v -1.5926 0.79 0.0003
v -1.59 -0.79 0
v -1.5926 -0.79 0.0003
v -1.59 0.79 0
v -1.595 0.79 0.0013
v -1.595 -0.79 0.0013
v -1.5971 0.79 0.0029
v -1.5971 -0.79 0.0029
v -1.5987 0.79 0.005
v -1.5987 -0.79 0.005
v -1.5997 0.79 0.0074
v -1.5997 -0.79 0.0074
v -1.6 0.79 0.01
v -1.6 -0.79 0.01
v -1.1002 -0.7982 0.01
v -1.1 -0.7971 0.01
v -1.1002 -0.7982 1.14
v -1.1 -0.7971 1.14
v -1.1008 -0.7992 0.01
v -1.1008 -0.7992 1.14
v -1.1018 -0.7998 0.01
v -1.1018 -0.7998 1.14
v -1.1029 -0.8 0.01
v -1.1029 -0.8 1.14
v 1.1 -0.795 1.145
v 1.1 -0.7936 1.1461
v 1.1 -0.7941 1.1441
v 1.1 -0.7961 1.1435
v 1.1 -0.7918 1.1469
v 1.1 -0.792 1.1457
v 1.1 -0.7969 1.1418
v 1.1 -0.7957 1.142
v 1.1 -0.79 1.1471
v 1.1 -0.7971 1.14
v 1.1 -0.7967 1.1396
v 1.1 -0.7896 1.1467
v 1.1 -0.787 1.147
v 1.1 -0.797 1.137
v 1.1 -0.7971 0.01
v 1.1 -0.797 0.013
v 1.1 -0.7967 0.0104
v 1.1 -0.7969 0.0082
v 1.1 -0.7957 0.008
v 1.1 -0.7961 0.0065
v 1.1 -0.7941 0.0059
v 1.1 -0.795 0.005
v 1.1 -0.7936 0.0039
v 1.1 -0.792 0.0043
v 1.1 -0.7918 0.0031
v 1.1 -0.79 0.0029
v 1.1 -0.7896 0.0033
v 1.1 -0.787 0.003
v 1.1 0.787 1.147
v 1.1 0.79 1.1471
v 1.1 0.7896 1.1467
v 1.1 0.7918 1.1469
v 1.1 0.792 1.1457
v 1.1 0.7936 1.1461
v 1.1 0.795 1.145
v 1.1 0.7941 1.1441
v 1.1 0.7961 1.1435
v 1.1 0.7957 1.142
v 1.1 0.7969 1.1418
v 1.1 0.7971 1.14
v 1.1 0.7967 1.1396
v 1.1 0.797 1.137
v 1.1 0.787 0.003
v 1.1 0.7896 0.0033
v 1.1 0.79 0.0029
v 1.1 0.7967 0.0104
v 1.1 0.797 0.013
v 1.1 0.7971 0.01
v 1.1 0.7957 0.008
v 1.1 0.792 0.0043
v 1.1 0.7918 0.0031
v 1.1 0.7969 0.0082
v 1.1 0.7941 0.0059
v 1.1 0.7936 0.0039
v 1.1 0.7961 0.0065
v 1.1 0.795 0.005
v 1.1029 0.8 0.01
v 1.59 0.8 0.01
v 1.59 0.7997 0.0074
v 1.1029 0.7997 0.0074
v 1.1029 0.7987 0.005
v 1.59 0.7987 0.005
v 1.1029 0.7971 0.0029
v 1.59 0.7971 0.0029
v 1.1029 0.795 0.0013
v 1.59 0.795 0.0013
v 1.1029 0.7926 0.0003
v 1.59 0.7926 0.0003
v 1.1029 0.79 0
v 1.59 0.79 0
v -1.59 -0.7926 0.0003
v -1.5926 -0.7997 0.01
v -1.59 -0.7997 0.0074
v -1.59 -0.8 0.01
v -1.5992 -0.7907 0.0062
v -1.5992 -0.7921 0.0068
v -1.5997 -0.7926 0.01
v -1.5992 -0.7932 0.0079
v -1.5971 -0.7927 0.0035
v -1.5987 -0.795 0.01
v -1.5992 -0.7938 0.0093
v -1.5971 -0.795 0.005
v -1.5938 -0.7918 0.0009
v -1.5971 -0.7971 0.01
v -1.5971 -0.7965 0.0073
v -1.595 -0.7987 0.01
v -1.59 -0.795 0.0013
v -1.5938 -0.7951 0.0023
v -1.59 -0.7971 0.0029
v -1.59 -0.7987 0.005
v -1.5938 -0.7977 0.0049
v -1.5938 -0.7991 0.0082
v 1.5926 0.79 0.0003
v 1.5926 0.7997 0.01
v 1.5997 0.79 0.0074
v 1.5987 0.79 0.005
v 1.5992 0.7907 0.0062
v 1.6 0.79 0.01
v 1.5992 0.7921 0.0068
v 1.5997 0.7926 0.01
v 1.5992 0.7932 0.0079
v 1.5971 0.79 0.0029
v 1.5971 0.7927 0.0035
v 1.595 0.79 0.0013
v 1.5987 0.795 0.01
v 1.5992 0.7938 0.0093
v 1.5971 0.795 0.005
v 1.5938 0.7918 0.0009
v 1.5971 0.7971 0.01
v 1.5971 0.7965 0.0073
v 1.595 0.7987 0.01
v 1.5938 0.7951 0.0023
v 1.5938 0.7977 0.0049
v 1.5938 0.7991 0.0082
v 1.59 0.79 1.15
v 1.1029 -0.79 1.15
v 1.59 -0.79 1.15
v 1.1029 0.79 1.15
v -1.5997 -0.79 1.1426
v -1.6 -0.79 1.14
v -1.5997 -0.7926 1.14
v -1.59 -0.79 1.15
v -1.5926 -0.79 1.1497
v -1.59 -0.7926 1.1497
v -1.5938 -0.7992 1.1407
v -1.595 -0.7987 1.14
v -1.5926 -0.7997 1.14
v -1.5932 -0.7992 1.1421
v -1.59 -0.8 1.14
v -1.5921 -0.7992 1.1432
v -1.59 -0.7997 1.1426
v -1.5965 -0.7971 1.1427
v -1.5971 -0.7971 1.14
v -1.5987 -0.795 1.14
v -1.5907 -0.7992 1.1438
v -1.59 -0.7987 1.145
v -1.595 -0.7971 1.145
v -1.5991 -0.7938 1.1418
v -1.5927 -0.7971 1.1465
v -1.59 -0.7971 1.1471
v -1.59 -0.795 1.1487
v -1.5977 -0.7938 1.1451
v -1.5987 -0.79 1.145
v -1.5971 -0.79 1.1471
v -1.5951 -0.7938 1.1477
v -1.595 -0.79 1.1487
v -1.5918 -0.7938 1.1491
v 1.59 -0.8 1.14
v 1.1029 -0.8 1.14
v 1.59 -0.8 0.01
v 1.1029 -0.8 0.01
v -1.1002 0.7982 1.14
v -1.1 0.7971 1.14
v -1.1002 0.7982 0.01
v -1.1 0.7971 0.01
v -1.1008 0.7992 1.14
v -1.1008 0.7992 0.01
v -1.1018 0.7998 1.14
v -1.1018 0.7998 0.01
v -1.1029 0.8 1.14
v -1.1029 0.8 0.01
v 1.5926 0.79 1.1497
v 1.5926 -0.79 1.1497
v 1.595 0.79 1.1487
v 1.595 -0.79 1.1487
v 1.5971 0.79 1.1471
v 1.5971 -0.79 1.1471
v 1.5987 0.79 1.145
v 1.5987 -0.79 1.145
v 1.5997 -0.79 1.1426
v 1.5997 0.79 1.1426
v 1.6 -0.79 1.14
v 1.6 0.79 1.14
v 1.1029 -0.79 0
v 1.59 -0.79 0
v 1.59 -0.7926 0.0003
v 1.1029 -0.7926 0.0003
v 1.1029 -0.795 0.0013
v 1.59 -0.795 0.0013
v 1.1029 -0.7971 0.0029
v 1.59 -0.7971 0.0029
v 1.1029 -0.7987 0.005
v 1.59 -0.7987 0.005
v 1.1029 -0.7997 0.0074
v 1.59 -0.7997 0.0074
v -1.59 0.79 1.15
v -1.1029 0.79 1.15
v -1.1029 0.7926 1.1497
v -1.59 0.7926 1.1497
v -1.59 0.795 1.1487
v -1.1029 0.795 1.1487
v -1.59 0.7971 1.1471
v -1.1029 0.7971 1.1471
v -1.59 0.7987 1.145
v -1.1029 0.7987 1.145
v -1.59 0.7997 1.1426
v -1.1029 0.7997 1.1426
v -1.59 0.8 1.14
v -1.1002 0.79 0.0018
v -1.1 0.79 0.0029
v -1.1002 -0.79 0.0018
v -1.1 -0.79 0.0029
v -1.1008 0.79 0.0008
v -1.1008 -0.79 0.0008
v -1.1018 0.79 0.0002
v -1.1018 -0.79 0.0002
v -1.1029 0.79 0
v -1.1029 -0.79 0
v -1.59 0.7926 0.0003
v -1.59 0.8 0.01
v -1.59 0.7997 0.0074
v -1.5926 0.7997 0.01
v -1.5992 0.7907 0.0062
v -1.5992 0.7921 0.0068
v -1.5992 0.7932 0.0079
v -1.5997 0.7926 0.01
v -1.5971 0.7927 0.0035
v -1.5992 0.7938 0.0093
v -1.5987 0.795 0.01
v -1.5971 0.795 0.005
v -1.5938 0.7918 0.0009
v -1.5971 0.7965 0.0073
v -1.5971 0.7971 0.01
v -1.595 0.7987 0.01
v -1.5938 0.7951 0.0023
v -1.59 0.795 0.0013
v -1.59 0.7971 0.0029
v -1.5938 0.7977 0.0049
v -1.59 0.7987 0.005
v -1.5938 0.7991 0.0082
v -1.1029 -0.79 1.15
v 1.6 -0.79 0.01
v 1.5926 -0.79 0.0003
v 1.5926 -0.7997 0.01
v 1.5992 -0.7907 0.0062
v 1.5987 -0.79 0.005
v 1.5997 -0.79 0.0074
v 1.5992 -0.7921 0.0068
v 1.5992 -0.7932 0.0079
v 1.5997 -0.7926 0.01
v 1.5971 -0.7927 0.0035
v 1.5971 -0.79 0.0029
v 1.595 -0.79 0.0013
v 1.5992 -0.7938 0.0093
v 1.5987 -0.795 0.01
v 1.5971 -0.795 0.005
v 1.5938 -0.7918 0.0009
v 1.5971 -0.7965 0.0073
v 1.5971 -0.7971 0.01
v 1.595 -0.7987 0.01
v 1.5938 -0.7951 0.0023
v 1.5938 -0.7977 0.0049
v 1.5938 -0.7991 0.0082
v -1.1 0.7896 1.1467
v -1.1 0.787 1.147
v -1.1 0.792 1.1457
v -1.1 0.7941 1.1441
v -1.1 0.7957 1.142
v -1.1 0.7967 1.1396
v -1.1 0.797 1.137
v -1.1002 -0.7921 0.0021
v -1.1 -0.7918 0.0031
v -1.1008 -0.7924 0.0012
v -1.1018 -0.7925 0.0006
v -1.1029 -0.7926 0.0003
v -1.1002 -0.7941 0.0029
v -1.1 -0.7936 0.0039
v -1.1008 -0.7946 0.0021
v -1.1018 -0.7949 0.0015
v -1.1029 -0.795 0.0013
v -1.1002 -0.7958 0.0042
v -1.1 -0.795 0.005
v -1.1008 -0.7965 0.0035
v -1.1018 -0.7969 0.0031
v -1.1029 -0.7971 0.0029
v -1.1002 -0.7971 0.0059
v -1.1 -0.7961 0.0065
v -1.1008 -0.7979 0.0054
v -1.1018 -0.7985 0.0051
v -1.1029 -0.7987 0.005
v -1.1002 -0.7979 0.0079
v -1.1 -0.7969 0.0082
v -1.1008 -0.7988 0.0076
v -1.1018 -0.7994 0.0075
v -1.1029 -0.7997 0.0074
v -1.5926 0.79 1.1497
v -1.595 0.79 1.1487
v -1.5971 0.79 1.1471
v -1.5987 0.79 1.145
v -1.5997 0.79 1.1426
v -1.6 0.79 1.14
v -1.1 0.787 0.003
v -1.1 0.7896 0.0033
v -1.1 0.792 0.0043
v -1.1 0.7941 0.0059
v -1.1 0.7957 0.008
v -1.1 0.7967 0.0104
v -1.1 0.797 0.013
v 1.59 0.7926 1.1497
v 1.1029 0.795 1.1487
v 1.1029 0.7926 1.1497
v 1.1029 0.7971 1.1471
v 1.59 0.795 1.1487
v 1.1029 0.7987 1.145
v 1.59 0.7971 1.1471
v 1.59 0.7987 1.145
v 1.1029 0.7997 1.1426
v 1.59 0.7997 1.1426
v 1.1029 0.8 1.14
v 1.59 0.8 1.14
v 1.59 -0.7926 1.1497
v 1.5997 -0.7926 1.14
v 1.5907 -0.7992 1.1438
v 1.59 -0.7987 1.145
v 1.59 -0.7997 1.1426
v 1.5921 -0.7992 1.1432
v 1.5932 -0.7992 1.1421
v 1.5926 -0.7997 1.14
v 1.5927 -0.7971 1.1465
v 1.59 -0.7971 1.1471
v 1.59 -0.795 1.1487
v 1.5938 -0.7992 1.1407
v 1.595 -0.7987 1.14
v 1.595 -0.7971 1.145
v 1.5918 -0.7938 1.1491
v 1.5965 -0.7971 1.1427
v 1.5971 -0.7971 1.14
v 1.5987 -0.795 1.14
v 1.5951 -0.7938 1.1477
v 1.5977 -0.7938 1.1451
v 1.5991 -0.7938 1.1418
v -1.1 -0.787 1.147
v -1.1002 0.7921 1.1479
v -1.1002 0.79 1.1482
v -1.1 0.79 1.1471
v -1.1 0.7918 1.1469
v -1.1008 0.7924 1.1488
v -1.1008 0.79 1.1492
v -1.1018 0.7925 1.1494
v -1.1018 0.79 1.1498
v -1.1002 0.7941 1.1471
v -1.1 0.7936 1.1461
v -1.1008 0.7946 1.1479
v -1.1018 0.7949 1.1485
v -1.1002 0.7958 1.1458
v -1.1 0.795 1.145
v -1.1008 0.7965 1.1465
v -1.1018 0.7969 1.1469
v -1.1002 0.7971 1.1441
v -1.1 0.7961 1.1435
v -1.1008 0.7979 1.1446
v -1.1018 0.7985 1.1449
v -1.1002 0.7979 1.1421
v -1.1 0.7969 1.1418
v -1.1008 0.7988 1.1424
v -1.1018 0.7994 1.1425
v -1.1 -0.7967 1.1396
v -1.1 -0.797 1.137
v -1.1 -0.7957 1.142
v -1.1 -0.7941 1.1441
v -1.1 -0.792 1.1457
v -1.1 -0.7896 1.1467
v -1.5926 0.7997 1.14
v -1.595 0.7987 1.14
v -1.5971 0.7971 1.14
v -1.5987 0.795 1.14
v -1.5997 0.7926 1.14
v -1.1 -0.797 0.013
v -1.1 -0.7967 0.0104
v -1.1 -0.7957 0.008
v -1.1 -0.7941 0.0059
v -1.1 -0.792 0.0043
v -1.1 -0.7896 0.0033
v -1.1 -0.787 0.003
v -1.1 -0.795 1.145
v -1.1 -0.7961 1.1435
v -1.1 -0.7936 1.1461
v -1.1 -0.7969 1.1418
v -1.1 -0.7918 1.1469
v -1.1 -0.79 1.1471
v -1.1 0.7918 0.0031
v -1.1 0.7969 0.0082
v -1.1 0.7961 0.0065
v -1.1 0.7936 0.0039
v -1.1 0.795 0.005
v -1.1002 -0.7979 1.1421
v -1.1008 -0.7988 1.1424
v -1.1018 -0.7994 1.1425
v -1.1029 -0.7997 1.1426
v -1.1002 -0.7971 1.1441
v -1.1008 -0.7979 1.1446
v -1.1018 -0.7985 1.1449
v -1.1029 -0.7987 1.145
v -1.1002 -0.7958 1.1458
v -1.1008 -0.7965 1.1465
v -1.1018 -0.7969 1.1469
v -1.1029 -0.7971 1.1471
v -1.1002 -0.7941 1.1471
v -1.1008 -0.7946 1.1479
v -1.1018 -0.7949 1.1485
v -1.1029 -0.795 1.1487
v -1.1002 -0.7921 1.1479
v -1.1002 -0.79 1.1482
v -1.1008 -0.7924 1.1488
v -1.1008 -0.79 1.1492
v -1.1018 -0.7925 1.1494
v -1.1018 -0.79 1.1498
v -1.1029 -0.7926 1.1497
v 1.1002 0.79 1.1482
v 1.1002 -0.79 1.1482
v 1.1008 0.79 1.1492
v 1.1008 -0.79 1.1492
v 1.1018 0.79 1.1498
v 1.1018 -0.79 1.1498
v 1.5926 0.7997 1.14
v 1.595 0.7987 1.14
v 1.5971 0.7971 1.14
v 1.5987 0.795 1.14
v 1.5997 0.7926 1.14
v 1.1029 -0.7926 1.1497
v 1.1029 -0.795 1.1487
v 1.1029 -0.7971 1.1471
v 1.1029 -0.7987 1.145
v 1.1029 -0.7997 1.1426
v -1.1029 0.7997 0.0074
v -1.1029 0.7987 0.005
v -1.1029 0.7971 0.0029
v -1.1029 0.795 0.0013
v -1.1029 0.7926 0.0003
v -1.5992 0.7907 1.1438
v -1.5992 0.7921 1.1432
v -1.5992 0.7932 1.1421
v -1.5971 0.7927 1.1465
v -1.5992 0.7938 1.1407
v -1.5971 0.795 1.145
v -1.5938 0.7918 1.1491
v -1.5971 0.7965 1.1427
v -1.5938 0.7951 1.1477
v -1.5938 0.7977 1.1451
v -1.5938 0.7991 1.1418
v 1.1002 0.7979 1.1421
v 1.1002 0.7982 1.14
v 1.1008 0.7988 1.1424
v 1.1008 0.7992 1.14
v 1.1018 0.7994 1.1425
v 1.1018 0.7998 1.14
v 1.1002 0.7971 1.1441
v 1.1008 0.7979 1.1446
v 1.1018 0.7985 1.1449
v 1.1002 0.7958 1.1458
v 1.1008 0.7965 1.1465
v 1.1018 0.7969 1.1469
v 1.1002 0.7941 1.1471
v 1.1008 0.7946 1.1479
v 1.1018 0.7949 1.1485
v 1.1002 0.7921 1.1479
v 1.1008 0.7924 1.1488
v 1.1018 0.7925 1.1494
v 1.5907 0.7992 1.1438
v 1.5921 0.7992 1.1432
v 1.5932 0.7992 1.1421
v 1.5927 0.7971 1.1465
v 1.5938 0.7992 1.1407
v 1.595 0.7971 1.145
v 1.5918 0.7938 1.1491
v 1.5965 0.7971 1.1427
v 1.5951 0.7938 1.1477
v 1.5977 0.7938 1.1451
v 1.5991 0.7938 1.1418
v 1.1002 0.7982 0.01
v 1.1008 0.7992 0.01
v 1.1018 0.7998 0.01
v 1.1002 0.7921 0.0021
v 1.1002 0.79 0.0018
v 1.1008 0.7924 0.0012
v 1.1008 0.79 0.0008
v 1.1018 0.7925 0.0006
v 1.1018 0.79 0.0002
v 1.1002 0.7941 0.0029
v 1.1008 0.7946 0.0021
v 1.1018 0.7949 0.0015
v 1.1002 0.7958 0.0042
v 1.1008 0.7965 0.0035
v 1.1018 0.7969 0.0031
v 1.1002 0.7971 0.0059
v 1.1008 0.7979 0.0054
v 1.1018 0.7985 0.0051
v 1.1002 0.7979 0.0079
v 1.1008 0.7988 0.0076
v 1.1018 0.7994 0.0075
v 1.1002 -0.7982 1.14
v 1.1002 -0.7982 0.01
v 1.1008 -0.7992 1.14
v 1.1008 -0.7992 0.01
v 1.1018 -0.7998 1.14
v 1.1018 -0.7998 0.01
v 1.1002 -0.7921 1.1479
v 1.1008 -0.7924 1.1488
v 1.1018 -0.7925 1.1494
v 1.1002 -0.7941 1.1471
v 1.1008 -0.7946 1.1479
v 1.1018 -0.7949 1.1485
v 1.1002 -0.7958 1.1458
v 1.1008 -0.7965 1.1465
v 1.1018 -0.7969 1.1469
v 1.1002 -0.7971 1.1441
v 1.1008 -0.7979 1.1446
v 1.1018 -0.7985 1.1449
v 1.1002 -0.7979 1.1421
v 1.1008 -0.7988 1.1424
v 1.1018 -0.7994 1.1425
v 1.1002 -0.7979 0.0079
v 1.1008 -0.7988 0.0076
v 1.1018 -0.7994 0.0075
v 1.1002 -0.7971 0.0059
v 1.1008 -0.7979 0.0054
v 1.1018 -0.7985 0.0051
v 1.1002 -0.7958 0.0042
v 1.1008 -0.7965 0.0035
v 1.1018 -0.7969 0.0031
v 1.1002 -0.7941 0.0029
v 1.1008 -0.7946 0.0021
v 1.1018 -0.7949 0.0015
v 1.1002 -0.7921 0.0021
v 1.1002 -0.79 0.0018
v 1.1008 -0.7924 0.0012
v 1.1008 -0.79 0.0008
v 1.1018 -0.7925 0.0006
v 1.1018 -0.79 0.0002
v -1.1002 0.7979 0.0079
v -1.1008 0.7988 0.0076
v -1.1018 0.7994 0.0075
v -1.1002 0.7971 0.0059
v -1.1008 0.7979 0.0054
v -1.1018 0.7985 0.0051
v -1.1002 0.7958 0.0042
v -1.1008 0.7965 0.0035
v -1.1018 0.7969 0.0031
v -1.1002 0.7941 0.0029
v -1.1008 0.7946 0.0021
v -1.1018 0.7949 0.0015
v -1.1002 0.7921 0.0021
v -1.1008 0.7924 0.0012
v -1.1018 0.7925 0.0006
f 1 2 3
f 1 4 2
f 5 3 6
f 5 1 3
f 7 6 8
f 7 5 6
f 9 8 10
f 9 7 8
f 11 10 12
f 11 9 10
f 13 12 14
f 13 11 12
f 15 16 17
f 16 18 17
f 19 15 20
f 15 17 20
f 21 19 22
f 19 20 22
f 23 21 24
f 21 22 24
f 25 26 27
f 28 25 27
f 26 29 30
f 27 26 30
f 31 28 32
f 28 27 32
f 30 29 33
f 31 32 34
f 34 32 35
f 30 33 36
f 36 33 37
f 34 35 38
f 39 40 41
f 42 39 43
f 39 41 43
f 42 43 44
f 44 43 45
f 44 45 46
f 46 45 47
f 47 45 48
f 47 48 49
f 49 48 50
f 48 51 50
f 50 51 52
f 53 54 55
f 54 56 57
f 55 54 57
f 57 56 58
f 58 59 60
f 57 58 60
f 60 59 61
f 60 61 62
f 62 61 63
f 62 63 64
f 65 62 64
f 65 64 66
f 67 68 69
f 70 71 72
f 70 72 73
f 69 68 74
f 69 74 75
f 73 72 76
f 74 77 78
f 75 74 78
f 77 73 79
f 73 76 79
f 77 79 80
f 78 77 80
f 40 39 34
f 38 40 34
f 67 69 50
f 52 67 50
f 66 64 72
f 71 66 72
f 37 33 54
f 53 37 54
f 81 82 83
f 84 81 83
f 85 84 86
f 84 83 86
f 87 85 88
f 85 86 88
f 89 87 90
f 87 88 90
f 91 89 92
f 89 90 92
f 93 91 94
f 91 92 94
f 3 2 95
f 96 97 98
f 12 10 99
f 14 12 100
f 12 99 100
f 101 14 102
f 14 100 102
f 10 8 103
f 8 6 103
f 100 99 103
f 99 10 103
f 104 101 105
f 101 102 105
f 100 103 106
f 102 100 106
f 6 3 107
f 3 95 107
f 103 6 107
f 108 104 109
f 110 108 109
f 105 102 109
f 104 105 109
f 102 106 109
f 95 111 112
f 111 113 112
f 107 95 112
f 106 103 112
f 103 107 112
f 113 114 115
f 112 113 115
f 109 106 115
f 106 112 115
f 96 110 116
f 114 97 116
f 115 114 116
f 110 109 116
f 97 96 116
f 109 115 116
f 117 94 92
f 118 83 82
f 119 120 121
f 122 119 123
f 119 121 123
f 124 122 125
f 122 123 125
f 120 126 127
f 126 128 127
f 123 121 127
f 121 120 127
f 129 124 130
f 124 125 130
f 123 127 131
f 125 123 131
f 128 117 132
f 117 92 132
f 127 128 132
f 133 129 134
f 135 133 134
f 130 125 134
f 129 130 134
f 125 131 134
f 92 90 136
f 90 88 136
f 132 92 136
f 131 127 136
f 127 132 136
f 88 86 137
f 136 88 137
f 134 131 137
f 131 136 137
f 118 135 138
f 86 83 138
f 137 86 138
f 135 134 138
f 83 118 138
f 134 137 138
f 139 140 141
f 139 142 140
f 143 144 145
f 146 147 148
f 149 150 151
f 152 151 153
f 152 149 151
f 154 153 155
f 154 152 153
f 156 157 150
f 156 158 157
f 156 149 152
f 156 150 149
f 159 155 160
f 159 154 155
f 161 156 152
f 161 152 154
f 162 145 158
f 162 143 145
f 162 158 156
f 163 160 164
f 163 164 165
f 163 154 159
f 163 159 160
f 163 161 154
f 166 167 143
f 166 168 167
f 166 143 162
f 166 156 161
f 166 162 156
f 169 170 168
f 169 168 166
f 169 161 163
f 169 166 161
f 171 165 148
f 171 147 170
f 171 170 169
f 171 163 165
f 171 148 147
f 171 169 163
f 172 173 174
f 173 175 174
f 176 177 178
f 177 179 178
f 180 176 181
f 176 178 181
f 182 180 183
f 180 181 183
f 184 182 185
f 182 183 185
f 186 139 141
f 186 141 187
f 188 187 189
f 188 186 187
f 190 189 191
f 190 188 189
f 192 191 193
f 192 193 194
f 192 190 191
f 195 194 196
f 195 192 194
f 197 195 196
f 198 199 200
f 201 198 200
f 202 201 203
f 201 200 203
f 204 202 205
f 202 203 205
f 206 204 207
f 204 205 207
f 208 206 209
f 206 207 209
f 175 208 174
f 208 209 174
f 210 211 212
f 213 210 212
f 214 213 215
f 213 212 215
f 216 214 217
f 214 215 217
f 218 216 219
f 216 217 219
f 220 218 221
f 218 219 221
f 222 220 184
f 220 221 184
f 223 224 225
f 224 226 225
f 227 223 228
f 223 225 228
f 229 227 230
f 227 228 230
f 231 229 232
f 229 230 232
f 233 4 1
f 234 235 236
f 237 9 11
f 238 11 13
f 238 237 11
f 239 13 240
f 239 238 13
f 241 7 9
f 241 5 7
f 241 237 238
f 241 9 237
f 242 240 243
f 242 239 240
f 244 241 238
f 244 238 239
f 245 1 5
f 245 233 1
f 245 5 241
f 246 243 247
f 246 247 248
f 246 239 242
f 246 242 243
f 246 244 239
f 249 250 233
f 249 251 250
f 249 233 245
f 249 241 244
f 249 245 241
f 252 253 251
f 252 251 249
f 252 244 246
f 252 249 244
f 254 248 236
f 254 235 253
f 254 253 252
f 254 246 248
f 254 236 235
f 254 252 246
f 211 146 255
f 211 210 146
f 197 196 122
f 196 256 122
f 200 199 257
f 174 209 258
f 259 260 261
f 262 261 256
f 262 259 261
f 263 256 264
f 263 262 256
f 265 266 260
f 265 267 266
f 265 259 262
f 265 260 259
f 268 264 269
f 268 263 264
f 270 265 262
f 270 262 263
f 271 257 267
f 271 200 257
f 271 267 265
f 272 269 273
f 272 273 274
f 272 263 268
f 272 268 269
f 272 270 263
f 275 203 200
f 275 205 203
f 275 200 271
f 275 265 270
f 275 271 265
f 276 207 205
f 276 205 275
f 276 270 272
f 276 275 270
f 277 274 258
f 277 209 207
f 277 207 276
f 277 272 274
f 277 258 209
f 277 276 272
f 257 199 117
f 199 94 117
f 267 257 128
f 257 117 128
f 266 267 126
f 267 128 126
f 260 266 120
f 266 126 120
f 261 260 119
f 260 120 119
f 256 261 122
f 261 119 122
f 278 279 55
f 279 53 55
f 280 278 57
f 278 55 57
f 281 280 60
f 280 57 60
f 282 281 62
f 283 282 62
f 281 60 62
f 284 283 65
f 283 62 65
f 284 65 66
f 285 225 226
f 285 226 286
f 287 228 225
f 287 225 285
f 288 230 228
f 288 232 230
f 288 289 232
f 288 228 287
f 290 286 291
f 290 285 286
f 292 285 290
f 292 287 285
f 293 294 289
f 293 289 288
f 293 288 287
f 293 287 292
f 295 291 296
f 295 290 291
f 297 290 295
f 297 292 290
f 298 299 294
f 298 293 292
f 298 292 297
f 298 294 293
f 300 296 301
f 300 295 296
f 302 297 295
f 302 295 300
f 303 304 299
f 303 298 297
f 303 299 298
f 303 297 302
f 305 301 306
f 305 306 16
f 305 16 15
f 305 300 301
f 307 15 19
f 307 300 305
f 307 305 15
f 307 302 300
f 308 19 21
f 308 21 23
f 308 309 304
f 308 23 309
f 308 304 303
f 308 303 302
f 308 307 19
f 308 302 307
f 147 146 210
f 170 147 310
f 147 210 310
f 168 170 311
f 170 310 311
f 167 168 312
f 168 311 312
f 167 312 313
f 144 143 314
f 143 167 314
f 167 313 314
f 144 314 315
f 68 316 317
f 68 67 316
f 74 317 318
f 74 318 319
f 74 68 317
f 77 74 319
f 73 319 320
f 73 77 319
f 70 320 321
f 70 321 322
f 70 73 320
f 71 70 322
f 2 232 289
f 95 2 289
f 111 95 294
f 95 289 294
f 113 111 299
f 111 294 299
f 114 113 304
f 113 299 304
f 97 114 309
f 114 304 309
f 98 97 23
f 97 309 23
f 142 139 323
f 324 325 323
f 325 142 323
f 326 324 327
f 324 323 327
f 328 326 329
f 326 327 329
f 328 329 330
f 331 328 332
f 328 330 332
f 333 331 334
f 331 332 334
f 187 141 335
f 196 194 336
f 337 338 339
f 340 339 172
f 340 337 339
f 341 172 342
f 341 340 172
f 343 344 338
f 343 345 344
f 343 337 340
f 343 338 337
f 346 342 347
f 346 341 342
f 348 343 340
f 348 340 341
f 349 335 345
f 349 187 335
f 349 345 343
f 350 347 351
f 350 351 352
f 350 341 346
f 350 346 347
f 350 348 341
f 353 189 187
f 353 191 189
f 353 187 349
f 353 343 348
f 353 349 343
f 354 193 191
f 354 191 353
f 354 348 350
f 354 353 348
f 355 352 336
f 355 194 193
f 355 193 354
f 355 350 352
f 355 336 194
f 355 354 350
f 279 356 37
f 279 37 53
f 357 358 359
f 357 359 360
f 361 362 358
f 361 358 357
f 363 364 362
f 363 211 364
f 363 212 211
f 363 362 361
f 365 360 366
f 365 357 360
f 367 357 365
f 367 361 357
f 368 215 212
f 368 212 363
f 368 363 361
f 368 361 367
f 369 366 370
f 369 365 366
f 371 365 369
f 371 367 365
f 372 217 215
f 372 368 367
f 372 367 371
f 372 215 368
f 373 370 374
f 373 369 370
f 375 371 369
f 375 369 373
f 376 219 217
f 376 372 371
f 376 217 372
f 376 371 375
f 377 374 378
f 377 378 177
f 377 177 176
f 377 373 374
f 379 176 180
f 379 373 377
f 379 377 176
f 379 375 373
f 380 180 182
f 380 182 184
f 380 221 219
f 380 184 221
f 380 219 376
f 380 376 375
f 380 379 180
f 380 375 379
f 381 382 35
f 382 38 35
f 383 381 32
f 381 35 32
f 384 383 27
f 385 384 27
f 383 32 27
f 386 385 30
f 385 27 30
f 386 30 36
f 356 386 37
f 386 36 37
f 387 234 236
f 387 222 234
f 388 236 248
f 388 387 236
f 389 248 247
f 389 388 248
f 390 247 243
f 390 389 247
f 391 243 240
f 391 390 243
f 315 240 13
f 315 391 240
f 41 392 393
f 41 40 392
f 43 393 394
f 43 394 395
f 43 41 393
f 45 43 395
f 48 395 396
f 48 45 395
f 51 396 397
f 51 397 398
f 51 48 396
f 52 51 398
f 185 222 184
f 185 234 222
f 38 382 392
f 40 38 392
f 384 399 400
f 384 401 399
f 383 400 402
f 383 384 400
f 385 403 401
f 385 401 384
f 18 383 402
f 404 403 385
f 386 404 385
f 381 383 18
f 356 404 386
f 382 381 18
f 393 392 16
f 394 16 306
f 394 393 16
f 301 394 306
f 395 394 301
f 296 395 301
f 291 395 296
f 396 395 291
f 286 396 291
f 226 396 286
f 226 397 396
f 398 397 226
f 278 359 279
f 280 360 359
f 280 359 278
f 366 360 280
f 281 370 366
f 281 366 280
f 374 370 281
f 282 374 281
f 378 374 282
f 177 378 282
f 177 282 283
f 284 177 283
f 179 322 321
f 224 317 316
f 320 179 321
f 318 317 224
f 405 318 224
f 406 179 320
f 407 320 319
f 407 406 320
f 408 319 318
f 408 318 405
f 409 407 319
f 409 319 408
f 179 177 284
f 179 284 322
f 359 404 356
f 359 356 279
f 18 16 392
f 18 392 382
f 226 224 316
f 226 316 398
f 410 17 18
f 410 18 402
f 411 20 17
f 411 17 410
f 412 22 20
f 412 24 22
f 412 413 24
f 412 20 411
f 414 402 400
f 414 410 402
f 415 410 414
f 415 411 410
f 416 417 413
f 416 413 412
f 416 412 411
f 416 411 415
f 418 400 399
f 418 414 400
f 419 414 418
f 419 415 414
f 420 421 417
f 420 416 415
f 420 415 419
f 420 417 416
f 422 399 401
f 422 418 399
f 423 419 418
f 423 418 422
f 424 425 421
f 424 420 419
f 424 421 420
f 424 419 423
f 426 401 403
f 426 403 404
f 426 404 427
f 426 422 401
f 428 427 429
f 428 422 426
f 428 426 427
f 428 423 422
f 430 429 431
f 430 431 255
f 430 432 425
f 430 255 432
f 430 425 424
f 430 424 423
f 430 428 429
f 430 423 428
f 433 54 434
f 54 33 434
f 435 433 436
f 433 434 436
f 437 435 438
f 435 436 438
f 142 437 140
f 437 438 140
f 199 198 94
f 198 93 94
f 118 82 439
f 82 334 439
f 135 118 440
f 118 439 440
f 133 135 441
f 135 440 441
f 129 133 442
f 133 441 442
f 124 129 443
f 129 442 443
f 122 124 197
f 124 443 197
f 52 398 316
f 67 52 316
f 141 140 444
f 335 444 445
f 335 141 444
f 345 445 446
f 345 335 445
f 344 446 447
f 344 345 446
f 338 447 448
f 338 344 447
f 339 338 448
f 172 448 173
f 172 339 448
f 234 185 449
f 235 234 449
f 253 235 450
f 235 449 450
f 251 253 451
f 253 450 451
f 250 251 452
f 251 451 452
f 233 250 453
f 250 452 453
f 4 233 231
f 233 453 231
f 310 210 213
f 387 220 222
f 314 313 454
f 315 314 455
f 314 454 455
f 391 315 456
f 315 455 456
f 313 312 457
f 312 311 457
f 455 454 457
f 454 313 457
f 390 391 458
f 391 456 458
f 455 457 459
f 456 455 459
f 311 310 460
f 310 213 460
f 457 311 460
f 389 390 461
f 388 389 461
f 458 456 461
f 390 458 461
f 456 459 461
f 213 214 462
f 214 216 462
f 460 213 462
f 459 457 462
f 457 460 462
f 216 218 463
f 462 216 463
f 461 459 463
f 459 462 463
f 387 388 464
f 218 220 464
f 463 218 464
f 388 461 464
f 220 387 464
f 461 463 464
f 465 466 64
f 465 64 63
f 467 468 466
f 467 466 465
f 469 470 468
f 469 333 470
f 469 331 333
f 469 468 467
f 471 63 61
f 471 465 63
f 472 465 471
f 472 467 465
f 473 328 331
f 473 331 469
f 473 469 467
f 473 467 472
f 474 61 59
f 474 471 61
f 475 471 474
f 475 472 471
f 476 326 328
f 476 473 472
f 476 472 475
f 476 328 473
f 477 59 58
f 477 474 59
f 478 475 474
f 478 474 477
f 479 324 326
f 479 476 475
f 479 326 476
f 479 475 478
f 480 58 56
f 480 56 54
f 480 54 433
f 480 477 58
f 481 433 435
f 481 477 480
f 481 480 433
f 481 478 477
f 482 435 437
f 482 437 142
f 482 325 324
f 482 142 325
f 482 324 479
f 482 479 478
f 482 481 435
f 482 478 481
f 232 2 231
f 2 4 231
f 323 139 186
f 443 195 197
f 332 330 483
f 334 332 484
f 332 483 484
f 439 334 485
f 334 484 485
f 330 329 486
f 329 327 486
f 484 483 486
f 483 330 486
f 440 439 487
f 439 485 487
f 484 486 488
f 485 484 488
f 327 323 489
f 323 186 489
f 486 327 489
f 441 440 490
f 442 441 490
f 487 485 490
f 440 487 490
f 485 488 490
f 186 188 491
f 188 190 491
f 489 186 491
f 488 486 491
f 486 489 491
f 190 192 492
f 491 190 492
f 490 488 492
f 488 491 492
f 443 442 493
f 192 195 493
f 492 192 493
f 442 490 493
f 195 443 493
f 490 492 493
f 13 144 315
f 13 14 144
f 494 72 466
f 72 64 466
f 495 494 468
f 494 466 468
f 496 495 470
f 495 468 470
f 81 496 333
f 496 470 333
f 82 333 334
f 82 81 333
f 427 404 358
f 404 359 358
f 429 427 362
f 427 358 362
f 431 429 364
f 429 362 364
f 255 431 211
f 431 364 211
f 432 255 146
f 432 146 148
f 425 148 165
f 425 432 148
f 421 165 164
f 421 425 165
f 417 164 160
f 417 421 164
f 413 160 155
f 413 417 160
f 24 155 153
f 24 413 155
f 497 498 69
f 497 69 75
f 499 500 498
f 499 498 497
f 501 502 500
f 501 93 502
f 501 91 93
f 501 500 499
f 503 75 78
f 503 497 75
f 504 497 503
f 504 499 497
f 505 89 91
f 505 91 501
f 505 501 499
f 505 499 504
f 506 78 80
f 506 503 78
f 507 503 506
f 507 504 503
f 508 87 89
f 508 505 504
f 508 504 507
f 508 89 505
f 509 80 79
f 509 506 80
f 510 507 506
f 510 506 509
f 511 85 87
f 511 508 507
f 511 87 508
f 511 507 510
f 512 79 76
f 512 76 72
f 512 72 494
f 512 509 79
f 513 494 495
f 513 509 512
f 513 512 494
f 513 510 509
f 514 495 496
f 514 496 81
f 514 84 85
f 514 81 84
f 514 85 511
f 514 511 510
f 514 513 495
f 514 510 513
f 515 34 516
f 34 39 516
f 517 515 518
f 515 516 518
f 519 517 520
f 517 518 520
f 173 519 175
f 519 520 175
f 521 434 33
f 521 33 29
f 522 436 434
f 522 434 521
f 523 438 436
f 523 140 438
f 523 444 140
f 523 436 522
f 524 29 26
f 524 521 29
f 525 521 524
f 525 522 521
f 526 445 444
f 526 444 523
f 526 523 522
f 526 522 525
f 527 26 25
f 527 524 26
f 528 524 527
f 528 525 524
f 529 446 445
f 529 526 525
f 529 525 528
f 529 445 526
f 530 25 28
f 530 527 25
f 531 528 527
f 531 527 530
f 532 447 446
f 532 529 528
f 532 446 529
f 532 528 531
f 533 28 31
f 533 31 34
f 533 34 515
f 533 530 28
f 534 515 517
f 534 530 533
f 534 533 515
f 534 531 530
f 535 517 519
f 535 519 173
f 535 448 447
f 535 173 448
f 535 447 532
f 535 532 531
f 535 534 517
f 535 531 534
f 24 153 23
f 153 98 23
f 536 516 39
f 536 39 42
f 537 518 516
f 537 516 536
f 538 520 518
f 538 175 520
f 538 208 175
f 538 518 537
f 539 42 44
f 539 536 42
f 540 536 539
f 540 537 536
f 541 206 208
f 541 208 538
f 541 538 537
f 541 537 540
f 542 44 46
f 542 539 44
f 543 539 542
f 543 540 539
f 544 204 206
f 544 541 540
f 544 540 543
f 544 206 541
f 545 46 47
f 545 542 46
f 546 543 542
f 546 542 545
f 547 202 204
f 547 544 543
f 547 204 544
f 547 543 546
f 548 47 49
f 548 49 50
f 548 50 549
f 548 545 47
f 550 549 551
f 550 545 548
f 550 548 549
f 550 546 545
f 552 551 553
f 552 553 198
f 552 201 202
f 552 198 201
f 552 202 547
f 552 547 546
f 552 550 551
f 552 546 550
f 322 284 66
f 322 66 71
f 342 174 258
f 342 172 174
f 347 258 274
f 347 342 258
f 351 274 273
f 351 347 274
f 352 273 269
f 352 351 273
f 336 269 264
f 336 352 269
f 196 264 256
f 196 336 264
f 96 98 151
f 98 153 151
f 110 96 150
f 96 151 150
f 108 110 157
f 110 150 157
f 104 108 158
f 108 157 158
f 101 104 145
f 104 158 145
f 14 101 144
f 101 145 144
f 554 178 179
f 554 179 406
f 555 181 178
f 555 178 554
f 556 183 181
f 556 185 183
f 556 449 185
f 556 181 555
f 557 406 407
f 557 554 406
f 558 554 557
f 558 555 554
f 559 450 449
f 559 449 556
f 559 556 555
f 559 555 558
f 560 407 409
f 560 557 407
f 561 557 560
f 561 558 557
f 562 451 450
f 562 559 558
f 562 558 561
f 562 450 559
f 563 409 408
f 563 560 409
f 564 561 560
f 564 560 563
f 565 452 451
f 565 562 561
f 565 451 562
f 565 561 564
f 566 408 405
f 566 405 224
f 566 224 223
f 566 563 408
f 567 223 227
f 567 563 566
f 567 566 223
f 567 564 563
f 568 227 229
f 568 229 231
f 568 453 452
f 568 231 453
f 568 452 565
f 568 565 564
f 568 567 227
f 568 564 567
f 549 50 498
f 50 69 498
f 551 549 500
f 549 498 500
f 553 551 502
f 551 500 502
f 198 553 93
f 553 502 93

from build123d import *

# Parameters (mm, degrees)
SKETCH1_W                           = 3.2
SKETCH1_H                           = 1.6
ALL_BODY_DEPTH                      = 1.15
CUT_OUT_THE_BODY_FOR_PIN_DEPTH      = 1.1
CUT_OUT_THE_BODY_FOR_PIN_DEPTH_BACK = 1.1
SKETCH2_OUTSIDE_W                   = 3.902
SKETCH2_OUTSIDE_H                   = 4.352
SKETCH2_OUTSIDE_W_2                 = 1.144
SKETCH2_OUTSIDE_H_2                 = 1.594
BODY_FILLET_R                       = 0.01
PIN_FILLET_A_R                      = 0.01
PIN_FILLET_B_R                      = 0.003


with BuildPart() as part:
    # Sketch1 → All body (new body)
    with BuildSketch(Plane.XY):
        Rectangle(SKETCH1_W, SKETCH1_H)
    extrude(amount=ALL_BODY_DEPTH)

    # Sketch2 outside → Cut out the body for pin (cut, two sides: drawn at the far end of the back side and taken through both)
    with BuildSketch(Plane(origin=(0, 0, 0), x_dir=(0, 0, -1), z_dir=(1, 0, 0)).offset(-CUT_OUT_THE_BODY_FOR_PIN_DEPTH_BACK)):
        with Locations((-0.575, 0)):
            Rectangle(SKETCH2_OUTSIDE_W, SKETCH2_OUTSIDE_H)
        with Locations((-0.575, 0)):
            Rectangle(SKETCH2_OUTSIDE_W_2, SKETCH2_OUTSIDE_H_2, mode=Mode.SUBTRACT)
    extrude(amount=CUT_OUT_THE_BODY_FOR_PIN_DEPTH + CUT_OUT_THE_BODY_FOR_PIN_DEPTH_BACK, mode=Mode.SUBTRACT)

    # Body fillet
    body_fillet_edges = [part.edges().sort_by_distance(p)[0] for p in [
        (0, 0.797, 0.003),
        (0, 0.797, 1.147),
        (0, -0.797, 1.147),
        (0, -0.797, 0.003),
    ]]
    fillet(body_fillet_edges, radius=BODY_FILLET_R)

    # Pin fillet a
    pin_fillet_a_edges = [part.edges().sort_by_distance(p)[0] for p in [
        (1.6, 0, 1.15),
        (-1.35, 0.8, 0),
        (1.35, -0.8, 0),
        (1.35, -0.8, 1.15),
        (-1.35, 0.8, 1.15),
        (1.35, 0.8, 1.15),
        (-1.6, 0, 1.15),
        (1.35, 0.8, 0),
        (1.6, 0, 0),
        (-1.35, -0.8, 0),
        (-1.6, 0, 0),
        (-1.6, 0.8, 0.575),
        (1.6, 0.8, 0.575),
        (1.6, -0.8, 0.575),
        (-1.6, -0.8, 0.575),
        (-1.35, -0.8, 1.15),
    ]]
    fillet(pin_fillet_a_edges, radius=PIN_FILLET_A_R)

    # Pin fillet b
    pin_fillet_b_edges = [part.edges().sort_by_distance(p)[0] for p in [
        (1.1, -0.8, 0.575),
        (1.1, 0, 1.15),
        (1.1, 0.8, 0.575),
        (1.1, 0, 0),
        (-1.1, 0.8, 0.575),
        (-1.1, 0, 1.15),
        (-1.1, -0.8, 0.575),
        (-1.1, 0, 0),
        (1.1, 0.797071068, 0.002928932),
        (1.1, -0.797071068, 0.002928932),
        (1.1, -0.797071068, 1.147071068),
        (1.1, 0.797071068, 1.147071068),
        (-1.1, -0.797071068, 1.147071068),
        (-1.1, 0.797071068, 1.147071068),
        (-1.1, -0.797071068, 0.002928932),
        (-1.1, 0.797071068, 0.002928932),
    ]]
    fillet(pin_fillet_b_edges, radius=PIN_FILLET_B_R - 0.0001)  # a hair under: the kernel refuses the full size


solid = part.part
